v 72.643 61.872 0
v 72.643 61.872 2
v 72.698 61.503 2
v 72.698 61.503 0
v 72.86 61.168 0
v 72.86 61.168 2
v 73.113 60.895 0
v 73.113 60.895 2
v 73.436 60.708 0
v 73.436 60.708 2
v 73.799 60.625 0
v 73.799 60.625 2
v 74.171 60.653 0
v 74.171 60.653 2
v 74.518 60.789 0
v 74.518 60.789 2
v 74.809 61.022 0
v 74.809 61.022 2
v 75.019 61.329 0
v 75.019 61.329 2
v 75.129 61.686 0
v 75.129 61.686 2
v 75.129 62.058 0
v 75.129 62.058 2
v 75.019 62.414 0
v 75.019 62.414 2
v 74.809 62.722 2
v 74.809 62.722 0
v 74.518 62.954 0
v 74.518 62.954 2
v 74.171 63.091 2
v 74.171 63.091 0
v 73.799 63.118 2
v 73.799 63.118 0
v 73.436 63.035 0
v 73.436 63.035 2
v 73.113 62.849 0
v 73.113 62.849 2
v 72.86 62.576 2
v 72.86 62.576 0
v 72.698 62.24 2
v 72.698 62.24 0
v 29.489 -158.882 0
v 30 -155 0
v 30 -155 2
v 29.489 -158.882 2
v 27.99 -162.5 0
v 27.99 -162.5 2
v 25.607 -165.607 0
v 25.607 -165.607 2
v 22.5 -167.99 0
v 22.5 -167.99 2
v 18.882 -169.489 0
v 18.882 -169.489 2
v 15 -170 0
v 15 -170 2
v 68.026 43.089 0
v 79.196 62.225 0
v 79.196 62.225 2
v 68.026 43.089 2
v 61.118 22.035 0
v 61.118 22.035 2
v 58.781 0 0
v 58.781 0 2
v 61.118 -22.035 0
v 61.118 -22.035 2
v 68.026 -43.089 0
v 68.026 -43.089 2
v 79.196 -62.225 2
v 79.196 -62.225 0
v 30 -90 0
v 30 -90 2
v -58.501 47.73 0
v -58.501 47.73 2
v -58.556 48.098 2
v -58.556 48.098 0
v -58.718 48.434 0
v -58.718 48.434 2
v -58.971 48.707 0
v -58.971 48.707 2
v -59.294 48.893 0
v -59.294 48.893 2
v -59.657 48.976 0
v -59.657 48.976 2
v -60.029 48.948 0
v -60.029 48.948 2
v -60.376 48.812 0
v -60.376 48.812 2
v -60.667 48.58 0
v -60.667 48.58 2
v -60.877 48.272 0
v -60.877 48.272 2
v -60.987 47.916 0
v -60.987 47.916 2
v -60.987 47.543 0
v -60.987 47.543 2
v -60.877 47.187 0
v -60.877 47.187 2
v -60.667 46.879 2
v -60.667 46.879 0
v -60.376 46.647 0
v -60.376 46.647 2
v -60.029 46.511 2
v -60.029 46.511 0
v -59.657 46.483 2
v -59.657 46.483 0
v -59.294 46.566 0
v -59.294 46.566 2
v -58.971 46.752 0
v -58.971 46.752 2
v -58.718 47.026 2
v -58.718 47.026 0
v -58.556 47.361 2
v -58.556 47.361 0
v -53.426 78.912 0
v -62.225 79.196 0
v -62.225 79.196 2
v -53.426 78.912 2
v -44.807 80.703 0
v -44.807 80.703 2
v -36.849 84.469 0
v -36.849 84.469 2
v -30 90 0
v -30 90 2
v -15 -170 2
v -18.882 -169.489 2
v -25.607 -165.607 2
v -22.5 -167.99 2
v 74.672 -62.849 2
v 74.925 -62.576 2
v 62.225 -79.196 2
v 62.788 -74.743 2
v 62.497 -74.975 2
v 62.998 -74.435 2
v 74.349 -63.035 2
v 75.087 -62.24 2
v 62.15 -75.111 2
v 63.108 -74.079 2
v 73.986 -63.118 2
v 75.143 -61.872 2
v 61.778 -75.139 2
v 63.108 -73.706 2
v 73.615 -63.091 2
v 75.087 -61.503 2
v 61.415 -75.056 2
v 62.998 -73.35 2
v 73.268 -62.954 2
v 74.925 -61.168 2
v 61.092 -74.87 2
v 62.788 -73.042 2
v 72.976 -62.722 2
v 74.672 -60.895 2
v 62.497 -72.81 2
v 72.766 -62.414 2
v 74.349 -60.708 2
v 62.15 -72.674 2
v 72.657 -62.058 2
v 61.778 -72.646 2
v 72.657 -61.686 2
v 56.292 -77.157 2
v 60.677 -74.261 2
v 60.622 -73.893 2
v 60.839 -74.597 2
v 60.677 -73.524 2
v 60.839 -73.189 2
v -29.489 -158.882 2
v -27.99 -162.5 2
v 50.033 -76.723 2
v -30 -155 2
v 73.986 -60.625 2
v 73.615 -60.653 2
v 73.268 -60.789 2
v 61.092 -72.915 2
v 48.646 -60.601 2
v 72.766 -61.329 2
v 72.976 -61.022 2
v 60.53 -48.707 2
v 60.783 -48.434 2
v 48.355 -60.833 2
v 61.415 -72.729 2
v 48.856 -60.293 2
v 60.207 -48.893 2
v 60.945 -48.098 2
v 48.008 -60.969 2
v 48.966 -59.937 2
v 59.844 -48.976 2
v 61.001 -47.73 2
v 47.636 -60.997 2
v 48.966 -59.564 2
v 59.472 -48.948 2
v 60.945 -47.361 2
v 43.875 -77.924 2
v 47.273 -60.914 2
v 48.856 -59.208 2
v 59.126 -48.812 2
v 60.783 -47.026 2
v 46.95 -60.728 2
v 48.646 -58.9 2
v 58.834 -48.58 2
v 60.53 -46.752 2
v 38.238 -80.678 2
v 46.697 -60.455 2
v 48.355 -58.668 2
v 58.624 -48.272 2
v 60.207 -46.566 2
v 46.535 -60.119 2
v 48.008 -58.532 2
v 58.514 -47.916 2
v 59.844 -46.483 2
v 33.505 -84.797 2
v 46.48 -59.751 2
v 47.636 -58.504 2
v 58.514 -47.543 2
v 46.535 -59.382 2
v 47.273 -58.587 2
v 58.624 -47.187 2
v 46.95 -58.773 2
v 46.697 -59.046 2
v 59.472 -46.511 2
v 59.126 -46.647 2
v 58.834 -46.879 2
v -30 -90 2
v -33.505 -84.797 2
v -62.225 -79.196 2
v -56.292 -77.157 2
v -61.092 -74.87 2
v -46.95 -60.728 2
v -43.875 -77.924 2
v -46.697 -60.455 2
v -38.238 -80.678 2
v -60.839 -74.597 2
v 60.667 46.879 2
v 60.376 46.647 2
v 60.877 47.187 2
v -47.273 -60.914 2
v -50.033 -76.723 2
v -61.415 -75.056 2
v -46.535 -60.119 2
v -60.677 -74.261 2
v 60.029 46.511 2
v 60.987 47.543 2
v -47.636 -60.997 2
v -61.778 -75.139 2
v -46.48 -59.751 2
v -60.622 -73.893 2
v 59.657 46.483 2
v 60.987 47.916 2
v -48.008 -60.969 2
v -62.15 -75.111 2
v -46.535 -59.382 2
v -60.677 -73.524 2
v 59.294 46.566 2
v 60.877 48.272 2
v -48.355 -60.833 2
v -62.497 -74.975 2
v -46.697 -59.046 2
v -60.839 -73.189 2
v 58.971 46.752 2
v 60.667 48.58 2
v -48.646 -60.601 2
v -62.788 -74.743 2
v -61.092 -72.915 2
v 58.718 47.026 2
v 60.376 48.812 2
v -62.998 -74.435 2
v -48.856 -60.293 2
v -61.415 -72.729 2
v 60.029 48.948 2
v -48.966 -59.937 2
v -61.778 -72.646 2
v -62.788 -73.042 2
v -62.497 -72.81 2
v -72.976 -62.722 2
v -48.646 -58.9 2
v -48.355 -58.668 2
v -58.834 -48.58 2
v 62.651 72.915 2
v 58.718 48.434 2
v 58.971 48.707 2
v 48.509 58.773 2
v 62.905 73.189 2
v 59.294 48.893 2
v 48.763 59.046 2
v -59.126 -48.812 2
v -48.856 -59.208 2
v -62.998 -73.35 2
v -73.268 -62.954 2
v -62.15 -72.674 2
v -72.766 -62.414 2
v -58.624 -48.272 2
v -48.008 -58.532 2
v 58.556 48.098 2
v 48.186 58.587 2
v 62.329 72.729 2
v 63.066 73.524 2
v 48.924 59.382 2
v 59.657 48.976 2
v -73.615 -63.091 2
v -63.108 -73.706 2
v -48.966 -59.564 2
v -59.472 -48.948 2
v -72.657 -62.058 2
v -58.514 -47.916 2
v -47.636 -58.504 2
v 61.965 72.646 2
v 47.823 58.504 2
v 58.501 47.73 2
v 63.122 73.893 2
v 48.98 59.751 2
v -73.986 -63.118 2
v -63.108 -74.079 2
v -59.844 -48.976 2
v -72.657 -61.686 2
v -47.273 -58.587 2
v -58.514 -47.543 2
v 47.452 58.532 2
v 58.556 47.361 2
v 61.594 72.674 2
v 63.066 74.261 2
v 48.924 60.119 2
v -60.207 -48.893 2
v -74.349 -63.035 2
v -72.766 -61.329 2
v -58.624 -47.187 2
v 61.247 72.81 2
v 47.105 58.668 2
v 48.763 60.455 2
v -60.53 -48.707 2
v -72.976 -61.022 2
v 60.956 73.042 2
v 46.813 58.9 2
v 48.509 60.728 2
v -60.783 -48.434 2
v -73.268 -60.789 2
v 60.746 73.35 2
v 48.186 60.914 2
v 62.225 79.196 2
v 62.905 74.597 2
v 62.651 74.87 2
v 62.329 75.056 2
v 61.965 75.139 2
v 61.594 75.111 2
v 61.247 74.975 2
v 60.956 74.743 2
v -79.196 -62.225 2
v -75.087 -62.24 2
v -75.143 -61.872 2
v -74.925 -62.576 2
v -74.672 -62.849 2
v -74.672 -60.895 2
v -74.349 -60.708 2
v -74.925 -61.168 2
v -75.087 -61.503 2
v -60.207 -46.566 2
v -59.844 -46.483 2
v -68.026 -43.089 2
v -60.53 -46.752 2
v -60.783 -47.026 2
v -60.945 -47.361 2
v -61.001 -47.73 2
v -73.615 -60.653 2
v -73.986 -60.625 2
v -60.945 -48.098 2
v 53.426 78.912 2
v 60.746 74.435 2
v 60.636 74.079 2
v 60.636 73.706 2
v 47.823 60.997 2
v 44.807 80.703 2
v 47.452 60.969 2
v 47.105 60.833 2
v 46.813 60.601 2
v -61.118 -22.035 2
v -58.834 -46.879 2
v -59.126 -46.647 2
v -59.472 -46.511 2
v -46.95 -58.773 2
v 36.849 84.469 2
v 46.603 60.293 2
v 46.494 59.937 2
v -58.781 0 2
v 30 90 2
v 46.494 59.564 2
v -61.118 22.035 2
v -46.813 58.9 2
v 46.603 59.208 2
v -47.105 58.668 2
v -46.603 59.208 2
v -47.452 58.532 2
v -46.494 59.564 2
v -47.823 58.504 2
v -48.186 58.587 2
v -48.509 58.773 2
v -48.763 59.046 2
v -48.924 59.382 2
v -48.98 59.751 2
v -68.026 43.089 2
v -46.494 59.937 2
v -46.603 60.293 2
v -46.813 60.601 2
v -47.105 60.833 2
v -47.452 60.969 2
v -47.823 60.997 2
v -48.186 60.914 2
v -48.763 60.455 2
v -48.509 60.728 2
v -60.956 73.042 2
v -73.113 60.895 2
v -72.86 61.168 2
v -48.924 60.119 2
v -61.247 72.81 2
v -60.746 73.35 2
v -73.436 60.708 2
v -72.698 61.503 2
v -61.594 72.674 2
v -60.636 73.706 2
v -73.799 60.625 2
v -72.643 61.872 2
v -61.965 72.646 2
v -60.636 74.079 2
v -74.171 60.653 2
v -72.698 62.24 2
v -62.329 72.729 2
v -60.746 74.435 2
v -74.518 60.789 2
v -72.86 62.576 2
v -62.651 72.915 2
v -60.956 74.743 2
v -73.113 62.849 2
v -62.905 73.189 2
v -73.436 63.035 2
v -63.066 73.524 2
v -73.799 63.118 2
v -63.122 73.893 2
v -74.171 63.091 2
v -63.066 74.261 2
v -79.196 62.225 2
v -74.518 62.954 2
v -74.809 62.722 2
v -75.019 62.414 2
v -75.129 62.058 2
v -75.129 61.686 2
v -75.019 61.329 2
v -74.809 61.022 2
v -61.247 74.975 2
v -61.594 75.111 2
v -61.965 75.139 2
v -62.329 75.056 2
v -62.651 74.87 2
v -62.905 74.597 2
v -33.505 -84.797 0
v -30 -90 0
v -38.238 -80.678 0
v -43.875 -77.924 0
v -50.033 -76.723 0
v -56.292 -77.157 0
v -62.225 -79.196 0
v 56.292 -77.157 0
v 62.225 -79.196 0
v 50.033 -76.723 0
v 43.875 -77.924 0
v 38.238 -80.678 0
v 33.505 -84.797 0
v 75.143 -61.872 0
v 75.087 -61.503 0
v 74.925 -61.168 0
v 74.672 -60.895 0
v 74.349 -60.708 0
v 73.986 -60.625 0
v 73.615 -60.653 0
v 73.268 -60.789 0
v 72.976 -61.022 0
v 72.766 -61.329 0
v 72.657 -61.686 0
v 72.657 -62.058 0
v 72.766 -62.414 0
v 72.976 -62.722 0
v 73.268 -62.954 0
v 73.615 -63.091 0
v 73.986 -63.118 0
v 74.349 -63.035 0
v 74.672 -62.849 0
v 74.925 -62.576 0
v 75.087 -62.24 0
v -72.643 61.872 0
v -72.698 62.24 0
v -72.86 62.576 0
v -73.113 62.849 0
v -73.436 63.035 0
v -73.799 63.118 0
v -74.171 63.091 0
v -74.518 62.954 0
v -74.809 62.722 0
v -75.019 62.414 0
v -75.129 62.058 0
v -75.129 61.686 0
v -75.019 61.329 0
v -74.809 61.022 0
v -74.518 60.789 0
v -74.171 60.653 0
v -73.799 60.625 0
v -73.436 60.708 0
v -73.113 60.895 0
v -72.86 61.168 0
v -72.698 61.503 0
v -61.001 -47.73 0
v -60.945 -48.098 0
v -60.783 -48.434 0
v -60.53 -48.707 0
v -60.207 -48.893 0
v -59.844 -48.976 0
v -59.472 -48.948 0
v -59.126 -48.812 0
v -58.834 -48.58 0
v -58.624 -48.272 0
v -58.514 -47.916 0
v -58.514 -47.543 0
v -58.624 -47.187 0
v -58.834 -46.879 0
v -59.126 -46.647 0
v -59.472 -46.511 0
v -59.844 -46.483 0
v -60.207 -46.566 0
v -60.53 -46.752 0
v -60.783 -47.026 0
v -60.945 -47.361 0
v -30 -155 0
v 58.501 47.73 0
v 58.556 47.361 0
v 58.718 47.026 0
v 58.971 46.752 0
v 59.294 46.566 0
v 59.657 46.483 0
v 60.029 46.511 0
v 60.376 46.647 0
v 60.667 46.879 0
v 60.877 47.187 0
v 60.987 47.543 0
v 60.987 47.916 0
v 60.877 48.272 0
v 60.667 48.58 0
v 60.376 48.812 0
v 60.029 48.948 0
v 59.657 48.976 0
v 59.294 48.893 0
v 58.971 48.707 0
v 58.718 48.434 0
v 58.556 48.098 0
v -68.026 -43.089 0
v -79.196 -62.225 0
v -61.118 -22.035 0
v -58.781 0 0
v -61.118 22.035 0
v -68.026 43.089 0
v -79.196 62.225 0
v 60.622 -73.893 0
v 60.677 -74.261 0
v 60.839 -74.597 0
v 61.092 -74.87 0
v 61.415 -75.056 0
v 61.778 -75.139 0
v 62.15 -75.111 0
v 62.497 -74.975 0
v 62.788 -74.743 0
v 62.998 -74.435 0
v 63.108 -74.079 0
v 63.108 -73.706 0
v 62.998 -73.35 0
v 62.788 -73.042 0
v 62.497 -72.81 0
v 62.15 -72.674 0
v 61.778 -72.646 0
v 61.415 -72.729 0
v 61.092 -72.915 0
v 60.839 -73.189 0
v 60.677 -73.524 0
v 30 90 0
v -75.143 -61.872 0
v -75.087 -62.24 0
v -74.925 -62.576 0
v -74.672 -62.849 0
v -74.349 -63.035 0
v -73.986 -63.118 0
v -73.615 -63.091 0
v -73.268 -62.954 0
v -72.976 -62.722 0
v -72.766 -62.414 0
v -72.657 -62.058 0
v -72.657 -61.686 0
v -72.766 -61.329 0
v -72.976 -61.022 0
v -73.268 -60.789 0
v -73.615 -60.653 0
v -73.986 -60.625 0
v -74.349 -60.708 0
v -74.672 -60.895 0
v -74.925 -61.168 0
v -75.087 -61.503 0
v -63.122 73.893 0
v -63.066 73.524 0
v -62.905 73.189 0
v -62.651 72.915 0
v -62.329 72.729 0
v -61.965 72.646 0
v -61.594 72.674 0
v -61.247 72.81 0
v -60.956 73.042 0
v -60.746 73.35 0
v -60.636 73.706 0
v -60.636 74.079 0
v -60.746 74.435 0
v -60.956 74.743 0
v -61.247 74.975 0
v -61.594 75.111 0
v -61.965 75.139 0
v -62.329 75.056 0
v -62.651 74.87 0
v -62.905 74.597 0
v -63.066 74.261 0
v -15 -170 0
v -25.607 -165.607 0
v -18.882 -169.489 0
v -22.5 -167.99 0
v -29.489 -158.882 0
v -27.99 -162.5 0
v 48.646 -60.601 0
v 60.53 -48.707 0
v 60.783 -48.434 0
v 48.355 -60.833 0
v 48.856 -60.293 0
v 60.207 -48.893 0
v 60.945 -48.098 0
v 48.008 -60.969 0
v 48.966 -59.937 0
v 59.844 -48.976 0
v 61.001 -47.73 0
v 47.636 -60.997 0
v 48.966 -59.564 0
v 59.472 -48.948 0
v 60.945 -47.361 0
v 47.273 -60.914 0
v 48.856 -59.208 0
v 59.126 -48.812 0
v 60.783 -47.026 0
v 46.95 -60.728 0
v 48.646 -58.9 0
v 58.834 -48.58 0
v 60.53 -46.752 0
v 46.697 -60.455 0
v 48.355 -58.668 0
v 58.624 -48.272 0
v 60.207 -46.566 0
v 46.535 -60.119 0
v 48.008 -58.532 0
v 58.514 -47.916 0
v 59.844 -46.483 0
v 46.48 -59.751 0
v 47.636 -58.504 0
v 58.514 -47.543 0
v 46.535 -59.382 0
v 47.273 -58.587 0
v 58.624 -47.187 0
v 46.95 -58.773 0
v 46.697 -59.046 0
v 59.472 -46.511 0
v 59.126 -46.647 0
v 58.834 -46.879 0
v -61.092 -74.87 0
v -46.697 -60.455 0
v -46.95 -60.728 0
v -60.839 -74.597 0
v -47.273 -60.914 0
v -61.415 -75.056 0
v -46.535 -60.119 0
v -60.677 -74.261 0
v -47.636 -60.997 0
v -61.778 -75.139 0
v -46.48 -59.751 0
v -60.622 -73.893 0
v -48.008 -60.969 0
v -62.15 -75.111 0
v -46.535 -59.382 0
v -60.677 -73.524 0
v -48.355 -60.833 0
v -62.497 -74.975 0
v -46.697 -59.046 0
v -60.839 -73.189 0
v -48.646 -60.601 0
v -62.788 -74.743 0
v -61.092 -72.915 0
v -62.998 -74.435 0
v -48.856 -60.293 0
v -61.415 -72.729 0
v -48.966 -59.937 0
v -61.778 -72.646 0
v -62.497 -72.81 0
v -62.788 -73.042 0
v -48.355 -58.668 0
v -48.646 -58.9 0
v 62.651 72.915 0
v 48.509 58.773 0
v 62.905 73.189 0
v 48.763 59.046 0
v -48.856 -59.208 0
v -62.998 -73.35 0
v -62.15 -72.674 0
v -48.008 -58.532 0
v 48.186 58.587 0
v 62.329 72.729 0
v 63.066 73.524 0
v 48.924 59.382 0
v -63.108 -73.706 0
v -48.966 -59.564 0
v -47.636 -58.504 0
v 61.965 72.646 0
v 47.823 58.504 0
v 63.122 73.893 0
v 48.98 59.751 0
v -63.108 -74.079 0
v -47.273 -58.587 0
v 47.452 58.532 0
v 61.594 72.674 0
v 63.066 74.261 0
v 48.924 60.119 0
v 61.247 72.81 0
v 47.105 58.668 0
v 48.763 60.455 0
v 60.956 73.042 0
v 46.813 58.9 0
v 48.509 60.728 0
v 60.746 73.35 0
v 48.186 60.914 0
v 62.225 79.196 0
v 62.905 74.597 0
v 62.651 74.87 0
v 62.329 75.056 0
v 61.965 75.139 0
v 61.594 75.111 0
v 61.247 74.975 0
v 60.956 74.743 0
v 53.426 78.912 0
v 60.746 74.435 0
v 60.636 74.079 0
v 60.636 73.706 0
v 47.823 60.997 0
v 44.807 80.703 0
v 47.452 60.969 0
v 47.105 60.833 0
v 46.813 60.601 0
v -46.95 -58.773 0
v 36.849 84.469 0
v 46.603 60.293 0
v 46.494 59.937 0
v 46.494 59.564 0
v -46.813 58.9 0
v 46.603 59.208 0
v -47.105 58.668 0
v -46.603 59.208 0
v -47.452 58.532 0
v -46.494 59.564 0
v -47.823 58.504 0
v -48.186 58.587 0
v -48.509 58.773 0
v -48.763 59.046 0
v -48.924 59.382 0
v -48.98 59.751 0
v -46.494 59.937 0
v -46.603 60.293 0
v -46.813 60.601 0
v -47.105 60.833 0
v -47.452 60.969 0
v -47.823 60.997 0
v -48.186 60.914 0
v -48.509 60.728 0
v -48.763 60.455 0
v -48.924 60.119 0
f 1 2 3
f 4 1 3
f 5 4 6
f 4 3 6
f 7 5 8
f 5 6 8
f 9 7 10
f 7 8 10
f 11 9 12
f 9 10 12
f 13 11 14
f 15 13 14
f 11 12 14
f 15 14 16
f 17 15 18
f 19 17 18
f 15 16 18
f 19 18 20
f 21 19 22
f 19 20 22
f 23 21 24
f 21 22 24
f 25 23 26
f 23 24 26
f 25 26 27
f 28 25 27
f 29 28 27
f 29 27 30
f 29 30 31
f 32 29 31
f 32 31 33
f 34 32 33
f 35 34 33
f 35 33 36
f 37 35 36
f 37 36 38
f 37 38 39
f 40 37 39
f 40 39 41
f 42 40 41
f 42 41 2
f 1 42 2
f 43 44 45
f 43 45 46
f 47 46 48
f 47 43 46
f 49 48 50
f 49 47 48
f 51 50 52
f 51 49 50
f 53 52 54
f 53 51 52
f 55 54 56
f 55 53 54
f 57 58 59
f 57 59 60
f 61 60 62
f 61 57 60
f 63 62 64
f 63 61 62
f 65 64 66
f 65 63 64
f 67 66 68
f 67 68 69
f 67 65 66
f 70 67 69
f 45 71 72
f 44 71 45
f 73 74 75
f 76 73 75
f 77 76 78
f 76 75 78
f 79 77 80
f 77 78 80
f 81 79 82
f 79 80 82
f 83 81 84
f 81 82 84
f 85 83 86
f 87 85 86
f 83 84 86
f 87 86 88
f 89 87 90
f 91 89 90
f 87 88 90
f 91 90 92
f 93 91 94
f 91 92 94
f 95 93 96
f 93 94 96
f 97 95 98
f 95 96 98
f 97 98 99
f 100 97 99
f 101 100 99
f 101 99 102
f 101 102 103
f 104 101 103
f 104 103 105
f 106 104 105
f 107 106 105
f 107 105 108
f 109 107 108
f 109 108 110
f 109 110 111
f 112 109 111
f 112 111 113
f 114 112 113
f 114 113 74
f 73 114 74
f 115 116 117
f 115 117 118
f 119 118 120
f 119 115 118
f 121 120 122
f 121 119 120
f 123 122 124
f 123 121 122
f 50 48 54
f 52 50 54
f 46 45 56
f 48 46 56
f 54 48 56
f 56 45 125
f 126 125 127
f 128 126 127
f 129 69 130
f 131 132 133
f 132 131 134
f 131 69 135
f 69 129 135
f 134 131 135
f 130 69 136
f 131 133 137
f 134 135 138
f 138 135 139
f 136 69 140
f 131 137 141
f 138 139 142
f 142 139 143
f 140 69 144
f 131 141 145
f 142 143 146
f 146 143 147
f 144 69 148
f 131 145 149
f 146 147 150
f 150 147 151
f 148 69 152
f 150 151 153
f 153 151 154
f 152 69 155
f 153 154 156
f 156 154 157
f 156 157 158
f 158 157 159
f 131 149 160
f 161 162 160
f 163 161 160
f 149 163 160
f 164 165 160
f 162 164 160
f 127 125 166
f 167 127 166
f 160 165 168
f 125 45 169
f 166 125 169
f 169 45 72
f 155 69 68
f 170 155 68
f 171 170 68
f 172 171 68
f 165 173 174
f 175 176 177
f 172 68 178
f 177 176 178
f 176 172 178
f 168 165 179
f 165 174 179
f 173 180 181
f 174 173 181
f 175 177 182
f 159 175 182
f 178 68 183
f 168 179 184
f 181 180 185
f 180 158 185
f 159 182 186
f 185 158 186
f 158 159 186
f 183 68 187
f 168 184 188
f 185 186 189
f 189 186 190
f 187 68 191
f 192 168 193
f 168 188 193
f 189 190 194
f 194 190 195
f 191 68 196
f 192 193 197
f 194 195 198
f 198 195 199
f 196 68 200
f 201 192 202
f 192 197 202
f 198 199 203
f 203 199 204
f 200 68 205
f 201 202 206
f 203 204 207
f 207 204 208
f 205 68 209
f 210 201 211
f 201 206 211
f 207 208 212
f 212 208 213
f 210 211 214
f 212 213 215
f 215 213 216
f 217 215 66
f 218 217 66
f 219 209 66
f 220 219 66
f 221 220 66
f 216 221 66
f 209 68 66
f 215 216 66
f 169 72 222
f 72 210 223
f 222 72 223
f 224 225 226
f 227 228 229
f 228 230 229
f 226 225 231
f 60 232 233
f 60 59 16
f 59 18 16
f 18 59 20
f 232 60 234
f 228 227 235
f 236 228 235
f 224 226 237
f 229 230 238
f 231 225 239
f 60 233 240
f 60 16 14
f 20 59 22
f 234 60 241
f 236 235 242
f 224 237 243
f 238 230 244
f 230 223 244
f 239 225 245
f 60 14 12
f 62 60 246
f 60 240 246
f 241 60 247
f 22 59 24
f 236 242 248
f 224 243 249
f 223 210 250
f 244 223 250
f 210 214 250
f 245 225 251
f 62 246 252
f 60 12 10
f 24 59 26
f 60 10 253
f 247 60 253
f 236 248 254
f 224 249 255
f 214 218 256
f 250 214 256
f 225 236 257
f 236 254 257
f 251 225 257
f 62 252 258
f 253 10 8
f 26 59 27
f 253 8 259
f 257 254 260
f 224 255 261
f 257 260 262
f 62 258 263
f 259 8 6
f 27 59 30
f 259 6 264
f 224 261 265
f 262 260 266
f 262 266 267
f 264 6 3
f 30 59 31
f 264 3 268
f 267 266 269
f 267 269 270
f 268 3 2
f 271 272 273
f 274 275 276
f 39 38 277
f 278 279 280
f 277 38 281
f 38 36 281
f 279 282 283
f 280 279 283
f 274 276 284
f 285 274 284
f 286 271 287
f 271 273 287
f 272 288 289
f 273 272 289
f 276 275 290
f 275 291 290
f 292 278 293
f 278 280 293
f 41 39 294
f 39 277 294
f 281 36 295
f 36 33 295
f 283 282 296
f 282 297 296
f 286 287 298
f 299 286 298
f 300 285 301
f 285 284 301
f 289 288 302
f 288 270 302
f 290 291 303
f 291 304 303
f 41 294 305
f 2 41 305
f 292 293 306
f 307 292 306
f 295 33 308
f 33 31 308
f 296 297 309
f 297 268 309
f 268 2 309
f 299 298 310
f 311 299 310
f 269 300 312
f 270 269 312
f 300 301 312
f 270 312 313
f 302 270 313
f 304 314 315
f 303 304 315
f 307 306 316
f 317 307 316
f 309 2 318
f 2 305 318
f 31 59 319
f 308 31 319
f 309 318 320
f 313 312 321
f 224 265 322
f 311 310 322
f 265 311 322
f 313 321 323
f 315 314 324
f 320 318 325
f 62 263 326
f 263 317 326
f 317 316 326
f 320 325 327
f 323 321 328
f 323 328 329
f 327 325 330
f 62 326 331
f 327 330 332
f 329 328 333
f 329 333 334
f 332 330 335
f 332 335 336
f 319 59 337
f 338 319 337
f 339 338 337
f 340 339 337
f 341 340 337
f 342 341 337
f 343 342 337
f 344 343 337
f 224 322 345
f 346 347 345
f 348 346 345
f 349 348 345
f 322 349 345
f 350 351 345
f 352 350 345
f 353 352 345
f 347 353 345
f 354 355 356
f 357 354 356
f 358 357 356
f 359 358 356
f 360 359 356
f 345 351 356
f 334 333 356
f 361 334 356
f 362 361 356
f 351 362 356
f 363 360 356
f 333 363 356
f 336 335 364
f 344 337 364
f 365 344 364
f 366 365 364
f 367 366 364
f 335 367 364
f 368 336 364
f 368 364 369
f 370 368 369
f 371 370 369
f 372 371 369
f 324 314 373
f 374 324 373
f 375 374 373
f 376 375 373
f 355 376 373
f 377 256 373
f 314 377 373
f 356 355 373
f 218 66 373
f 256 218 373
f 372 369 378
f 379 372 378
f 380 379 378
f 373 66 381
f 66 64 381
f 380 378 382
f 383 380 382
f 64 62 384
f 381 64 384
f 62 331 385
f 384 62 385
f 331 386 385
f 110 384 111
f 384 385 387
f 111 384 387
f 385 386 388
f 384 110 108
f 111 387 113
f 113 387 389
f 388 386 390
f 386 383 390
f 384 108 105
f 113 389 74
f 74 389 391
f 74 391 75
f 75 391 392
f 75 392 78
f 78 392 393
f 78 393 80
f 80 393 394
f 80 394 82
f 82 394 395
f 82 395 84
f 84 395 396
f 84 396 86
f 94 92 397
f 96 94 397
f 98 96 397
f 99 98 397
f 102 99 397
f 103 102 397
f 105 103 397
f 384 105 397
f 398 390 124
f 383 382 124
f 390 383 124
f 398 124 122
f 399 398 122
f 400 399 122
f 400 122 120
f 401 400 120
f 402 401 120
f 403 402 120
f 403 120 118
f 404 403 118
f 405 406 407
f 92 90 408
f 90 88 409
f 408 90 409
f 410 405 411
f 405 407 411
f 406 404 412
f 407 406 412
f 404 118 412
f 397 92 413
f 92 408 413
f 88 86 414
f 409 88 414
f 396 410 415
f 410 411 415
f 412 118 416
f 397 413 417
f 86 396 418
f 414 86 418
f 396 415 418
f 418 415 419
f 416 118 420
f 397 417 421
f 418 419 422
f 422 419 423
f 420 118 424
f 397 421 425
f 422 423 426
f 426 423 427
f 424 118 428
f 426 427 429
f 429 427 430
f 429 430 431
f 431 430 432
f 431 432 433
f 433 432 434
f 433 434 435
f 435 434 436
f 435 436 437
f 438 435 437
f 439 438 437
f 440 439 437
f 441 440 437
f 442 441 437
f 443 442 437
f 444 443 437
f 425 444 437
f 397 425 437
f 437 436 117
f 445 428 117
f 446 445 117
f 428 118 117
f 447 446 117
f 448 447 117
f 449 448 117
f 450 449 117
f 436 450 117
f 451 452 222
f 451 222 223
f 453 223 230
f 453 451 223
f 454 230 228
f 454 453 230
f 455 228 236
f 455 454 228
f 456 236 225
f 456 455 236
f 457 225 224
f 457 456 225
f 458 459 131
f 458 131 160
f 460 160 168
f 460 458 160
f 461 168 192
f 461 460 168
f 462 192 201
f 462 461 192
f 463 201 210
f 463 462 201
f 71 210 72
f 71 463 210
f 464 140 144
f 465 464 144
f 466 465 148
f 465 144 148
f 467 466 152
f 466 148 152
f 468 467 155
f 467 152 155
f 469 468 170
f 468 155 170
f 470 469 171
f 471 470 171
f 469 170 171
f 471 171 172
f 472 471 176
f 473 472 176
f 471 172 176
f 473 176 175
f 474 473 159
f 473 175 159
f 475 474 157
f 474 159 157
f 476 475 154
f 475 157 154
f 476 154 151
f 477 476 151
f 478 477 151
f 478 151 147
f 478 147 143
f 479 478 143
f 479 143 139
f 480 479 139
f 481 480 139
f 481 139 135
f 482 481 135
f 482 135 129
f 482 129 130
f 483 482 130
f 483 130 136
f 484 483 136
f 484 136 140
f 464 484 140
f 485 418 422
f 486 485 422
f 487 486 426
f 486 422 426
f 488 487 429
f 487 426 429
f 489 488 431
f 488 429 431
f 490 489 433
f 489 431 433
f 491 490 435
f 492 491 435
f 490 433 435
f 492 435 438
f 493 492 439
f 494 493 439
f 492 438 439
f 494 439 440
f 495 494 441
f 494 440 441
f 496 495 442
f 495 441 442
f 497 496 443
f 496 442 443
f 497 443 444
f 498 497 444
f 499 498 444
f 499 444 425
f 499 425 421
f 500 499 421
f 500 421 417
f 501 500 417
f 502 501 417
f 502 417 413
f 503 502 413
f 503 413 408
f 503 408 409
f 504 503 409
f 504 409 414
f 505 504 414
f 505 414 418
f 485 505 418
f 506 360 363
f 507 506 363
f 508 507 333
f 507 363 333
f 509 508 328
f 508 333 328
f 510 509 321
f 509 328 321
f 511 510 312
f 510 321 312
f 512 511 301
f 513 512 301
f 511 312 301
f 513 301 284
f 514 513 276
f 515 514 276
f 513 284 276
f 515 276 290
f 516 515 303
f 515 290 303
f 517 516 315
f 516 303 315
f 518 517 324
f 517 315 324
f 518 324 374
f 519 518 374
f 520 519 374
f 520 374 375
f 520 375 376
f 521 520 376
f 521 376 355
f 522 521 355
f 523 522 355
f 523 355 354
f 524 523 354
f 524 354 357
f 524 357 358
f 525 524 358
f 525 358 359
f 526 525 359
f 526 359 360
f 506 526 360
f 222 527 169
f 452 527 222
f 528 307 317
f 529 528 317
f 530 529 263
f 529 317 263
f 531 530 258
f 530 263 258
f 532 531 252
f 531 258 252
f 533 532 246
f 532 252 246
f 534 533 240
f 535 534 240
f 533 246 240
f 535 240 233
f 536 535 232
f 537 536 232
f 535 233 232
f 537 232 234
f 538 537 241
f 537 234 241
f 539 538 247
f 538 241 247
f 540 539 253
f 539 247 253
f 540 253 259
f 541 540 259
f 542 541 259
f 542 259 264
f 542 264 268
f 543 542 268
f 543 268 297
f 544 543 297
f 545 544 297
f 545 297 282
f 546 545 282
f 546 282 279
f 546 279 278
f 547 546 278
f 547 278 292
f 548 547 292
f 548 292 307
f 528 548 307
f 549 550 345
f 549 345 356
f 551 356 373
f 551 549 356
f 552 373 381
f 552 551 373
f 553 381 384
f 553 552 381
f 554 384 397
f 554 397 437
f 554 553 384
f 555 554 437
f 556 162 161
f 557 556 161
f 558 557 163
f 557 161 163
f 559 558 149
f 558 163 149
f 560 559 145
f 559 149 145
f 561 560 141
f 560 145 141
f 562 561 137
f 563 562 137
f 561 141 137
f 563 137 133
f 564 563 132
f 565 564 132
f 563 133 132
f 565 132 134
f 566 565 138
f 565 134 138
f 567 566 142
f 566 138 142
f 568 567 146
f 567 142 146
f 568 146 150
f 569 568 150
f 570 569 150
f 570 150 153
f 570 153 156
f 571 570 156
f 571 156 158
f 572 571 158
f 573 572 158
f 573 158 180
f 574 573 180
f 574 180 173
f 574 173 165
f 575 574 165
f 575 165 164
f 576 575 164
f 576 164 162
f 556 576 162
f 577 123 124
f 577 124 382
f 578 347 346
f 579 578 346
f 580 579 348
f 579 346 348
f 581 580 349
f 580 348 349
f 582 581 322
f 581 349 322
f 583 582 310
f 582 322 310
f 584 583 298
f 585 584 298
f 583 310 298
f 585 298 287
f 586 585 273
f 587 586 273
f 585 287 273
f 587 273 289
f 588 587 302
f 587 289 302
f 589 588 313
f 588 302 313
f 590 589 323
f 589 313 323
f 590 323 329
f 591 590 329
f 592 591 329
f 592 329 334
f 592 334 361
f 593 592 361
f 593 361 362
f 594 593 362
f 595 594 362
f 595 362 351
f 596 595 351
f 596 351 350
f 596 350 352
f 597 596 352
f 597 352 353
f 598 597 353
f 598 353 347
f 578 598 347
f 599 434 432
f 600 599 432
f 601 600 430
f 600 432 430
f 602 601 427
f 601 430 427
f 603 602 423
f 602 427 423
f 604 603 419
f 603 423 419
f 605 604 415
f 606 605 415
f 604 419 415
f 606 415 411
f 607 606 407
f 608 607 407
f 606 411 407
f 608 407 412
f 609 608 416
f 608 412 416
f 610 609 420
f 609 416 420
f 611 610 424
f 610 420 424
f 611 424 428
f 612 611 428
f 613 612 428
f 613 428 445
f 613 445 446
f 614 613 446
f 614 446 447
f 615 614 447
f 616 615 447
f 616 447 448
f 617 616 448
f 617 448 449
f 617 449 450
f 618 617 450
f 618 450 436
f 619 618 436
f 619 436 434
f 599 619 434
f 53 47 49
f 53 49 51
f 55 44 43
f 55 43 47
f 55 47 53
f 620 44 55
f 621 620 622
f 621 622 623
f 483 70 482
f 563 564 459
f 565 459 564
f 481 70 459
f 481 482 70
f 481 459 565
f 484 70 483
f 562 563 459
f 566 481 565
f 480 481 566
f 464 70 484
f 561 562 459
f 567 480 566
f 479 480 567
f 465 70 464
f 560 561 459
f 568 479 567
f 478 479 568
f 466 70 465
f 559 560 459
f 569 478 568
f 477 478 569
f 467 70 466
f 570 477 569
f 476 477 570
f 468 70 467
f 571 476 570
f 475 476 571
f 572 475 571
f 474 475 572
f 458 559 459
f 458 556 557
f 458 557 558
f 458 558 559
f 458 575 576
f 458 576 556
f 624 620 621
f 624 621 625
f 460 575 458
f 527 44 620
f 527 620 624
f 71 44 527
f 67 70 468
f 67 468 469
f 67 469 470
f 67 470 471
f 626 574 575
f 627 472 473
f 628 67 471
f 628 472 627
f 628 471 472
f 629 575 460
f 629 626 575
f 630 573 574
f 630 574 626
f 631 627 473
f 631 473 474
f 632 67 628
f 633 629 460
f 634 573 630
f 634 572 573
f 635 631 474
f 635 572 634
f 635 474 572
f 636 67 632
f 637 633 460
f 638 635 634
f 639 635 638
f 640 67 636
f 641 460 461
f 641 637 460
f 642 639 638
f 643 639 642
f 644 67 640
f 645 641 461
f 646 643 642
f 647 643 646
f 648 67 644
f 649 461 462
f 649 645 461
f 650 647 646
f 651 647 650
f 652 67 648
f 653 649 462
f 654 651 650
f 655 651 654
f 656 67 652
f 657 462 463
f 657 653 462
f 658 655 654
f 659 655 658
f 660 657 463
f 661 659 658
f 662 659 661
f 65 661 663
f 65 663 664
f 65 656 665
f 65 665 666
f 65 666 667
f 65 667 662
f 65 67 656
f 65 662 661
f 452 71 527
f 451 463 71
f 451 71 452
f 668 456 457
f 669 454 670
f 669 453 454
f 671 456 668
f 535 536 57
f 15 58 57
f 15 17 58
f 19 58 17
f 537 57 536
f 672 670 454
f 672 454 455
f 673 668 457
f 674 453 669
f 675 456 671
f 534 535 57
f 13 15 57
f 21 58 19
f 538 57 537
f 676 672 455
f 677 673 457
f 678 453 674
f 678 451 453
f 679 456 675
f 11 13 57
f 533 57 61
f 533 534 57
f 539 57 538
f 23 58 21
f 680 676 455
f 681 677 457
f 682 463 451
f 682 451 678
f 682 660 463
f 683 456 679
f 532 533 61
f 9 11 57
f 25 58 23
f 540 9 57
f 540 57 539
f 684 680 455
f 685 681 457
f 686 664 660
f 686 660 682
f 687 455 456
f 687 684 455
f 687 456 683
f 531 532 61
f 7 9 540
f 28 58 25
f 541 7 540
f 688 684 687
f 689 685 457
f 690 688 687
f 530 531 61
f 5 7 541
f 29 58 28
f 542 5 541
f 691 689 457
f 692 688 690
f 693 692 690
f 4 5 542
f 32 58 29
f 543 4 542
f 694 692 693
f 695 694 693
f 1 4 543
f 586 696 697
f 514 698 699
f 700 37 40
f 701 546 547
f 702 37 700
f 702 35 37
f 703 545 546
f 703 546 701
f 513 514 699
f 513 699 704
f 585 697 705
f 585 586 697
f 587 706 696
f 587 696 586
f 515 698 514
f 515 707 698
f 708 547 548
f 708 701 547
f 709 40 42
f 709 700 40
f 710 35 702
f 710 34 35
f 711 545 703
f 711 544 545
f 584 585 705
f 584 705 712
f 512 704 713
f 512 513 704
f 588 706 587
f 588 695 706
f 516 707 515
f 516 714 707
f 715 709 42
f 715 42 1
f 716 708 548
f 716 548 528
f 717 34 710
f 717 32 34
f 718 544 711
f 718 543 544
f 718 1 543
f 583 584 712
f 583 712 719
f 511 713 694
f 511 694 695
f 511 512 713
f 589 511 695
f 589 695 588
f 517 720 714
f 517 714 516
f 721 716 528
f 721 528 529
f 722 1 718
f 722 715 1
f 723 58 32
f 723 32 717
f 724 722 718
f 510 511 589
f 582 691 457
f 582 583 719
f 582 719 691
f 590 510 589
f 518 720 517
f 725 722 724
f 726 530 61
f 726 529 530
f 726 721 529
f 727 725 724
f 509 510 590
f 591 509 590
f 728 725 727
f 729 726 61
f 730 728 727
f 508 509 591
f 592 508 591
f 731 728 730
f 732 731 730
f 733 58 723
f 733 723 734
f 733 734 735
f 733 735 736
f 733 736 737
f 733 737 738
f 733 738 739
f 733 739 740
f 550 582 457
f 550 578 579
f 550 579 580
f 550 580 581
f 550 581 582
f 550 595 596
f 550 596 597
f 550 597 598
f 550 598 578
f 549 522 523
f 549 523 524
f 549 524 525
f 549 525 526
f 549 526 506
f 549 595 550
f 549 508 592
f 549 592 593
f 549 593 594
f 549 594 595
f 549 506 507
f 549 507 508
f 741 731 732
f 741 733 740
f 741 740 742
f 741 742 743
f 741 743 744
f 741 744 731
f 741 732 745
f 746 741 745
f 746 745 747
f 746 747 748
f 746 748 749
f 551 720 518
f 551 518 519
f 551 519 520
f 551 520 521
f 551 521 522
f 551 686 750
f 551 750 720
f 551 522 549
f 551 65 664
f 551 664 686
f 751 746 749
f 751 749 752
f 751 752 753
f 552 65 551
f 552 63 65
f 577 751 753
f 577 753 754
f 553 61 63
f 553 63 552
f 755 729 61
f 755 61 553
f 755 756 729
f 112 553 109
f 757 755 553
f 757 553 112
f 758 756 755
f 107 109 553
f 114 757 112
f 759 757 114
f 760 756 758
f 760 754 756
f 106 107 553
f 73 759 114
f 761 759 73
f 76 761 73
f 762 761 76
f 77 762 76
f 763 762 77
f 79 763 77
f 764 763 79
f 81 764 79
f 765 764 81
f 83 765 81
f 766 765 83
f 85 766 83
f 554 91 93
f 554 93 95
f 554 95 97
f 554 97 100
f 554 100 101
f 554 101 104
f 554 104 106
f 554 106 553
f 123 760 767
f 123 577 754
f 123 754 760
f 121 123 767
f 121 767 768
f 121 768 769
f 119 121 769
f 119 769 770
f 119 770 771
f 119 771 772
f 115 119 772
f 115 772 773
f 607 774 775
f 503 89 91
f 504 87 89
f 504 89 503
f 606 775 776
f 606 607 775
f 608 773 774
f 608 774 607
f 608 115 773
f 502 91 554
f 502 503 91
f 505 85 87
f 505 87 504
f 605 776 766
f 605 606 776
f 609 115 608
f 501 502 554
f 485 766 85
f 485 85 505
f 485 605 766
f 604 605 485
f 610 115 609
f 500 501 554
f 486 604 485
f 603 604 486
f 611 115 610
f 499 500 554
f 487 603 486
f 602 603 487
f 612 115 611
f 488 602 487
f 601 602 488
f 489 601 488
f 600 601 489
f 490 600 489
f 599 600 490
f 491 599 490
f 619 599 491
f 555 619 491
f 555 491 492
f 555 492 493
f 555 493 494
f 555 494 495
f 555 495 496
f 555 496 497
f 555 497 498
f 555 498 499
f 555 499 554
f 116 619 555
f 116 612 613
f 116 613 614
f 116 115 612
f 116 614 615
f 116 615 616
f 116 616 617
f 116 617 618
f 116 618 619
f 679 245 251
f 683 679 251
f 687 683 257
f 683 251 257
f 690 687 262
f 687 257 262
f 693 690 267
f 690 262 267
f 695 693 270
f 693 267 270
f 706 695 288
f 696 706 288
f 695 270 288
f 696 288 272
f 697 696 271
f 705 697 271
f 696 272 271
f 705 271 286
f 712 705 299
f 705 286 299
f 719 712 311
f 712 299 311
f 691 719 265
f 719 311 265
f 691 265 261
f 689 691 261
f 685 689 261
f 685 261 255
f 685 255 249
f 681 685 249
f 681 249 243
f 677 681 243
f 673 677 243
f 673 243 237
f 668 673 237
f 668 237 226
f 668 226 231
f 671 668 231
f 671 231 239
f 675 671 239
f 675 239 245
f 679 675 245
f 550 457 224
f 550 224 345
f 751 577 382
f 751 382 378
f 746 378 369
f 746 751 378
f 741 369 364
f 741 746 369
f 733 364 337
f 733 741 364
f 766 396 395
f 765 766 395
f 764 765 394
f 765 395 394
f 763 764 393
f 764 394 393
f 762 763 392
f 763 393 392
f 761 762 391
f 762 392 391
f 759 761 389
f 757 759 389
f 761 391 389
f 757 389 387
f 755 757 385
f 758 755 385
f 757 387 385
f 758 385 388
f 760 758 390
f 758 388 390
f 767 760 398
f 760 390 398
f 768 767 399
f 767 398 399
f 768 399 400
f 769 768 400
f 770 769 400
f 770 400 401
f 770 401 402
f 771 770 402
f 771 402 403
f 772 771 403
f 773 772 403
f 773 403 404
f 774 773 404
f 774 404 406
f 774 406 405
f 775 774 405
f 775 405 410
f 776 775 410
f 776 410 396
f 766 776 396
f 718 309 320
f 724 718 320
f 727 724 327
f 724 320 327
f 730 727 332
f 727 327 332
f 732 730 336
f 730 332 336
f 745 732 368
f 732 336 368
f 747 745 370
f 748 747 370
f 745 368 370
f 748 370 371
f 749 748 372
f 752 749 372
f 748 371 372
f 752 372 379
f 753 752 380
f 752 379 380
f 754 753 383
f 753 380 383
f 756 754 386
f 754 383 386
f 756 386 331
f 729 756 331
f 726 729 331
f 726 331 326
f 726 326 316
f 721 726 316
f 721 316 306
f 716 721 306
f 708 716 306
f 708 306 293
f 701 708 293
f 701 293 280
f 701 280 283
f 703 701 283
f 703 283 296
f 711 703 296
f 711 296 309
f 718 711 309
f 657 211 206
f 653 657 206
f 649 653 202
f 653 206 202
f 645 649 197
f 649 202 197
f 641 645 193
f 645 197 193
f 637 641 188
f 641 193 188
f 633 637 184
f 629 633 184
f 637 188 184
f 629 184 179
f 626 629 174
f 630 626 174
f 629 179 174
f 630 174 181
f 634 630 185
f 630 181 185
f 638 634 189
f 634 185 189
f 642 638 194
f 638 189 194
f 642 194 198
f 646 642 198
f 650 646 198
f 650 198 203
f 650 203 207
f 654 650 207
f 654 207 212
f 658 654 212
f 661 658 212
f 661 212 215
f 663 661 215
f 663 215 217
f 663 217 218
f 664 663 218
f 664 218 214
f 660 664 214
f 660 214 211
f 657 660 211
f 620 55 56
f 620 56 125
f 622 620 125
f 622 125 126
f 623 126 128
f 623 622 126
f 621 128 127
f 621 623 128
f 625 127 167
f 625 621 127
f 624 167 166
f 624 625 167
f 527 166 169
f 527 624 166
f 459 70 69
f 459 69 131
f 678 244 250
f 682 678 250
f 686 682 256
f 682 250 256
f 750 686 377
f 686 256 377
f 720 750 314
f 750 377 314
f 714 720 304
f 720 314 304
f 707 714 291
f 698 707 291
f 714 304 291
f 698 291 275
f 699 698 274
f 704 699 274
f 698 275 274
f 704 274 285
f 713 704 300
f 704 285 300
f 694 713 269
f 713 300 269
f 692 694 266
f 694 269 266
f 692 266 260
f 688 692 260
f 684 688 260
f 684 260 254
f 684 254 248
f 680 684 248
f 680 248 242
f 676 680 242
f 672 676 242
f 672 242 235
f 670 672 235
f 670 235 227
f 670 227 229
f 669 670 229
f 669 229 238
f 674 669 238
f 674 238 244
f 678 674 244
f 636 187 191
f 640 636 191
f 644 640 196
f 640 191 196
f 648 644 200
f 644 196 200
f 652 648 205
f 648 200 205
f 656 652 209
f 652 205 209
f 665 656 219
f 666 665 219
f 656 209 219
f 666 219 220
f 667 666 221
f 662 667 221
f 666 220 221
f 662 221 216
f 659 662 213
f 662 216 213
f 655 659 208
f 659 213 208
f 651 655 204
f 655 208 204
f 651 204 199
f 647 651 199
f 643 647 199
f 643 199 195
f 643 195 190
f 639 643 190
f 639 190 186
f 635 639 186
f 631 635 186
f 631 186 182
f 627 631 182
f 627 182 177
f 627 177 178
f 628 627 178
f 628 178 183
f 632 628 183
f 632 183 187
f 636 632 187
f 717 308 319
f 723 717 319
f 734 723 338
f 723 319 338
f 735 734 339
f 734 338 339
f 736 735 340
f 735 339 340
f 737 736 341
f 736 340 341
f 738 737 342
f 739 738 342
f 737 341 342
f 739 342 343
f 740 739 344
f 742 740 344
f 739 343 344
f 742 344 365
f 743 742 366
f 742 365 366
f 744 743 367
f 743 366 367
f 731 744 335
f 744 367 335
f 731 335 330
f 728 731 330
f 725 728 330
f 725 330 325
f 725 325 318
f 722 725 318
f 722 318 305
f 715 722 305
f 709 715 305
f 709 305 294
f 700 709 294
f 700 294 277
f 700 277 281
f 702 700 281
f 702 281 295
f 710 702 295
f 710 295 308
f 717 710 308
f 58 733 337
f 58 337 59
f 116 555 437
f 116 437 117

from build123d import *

# Parameters (mm, degrees)
BOSS_EXTRUDE1_DEPTH = 2
SKETCH3_R           = 1.25
CUT_EXTRUDE1_DEPTH  = 188.552659272


with BuildPart() as part:
    # Sketch2 → Boss-Extrude1 (new body)
    with BuildSketch(Plane.XY):
        with BuildLine():
            Line((-79.195959493, 62.225396744), (-62.225396744, 79.195959493))
            ThreePointArc((-62.225396744, 79.195959493), (-44.806778225, 80.702789346), (-30, 90))
            Line((-30, 90), (30, 90))
            ThreePointArc((30, 90), (44.806778225, 80.702789346), (62.225396744, 79.195959493))
            Line((62.225396744, 79.195959493), (79.195959493, 62.225396744))
            ThreePointArc((79.195959493, 62.225396744), (58.781303002, 0), (79.195959493, -62.225396744))
            Line((79.195959493, -62.225396744), (62.225396744, -79.195959493))
            ThreePointArc((62.225396744, -79.195959493), (43.875108319, -77.923881554), (30, -90))
            Line((30, -90), (30, -155))
            ThreePointArc((30, -155), (25.606601718, -165.606601718), (15, -170))
            Line((15, -170), (-15, -170))
            ThreePointArc((-15, -170), (-25.606601718, -165.606601718), (-30, -155))
            Line((-30, -155), (-30, -90))
            ThreePointArc((-30, -90), (-43.875108319, -77.923881554), (-62.225396744, -79.195959493))
            Line((-62.225396744, -79.195959493), (-79.195959493, -62.225396744))
            ThreePointArc((-79.195959493, -62.225396744), (-58.781303002, 0), (-79.195959493, 62.225396744))
        make_face()
    extrude(amount=BOSS_EXTRUDE1_DEPTH)

    # Sketch3 → Cut-Extrude1 (cut, through all)
    with BuildSketch(Plane.XY.offset(2)):
        with Locations((-73.892658634, 61.871843354)):
            Circle(SKETCH3_R)
        with Locations((-59.75052301, 47.72970773)):
            Circle(SKETCH3_R)
        with Locations(Location((-61.871843354, 73.892658634, 0), (0, 0, 180))):
            Circle(SKETCH3_R)
        with Locations(Location((-47.72970773, 59.75052301, 0), (0, 0, 180))):
            Circle(SKETCH3_R)
        with Locations(Location((59.75052301, 47.72970773, 0), (0, 0, 180))):
            Circle(SKETCH3_R)
        with Locations(Location((73.892658634, 61.871843354, 0), (0, 0, 180))):
            Circle(SKETCH3_R)
        with Locations((61.871843354, 73.892658634)):
            Circle(SKETCH3_R)
        with Locations((47.72970773, 59.75052301)):
            Circle(SKETCH3_R)
        with Locations(Location((-59.75052301, -47.72970773, 0), (0, 0, 180))):
            Circle(SKETCH3_R)
        with Locations((-47.72970773, -59.75052301)):
            Circle(SKETCH3_R)
        with Locations((-61.871843354, -73.892658634)):
            Circle(SKETCH3_R)
        with Locations(Location((-73.892658634, -61.871843354, 0), (0, 0, 180))):
            Circle(SKETCH3_R)
        with Locations((59.75052301, -47.72970773)):
            Circle(SKETCH3_R)
        with Locations((73.892658634, -61.871843354)):
            Circle(SKETCH3_R)
        with Locations(Location((61.871843354, -73.892658634, 0), (0, 0, 180))):
            Circle(SKETCH3_R)
        with Locations(Location((47.72970773, -59.75052301, 0), (0, 0, 180))):
            Circle(SKETCH3_R)
    extrude(amount=-CUT_EXTRUDE1_DEPTH, mode=Mode.SUBTRACT)


solid = part.part
